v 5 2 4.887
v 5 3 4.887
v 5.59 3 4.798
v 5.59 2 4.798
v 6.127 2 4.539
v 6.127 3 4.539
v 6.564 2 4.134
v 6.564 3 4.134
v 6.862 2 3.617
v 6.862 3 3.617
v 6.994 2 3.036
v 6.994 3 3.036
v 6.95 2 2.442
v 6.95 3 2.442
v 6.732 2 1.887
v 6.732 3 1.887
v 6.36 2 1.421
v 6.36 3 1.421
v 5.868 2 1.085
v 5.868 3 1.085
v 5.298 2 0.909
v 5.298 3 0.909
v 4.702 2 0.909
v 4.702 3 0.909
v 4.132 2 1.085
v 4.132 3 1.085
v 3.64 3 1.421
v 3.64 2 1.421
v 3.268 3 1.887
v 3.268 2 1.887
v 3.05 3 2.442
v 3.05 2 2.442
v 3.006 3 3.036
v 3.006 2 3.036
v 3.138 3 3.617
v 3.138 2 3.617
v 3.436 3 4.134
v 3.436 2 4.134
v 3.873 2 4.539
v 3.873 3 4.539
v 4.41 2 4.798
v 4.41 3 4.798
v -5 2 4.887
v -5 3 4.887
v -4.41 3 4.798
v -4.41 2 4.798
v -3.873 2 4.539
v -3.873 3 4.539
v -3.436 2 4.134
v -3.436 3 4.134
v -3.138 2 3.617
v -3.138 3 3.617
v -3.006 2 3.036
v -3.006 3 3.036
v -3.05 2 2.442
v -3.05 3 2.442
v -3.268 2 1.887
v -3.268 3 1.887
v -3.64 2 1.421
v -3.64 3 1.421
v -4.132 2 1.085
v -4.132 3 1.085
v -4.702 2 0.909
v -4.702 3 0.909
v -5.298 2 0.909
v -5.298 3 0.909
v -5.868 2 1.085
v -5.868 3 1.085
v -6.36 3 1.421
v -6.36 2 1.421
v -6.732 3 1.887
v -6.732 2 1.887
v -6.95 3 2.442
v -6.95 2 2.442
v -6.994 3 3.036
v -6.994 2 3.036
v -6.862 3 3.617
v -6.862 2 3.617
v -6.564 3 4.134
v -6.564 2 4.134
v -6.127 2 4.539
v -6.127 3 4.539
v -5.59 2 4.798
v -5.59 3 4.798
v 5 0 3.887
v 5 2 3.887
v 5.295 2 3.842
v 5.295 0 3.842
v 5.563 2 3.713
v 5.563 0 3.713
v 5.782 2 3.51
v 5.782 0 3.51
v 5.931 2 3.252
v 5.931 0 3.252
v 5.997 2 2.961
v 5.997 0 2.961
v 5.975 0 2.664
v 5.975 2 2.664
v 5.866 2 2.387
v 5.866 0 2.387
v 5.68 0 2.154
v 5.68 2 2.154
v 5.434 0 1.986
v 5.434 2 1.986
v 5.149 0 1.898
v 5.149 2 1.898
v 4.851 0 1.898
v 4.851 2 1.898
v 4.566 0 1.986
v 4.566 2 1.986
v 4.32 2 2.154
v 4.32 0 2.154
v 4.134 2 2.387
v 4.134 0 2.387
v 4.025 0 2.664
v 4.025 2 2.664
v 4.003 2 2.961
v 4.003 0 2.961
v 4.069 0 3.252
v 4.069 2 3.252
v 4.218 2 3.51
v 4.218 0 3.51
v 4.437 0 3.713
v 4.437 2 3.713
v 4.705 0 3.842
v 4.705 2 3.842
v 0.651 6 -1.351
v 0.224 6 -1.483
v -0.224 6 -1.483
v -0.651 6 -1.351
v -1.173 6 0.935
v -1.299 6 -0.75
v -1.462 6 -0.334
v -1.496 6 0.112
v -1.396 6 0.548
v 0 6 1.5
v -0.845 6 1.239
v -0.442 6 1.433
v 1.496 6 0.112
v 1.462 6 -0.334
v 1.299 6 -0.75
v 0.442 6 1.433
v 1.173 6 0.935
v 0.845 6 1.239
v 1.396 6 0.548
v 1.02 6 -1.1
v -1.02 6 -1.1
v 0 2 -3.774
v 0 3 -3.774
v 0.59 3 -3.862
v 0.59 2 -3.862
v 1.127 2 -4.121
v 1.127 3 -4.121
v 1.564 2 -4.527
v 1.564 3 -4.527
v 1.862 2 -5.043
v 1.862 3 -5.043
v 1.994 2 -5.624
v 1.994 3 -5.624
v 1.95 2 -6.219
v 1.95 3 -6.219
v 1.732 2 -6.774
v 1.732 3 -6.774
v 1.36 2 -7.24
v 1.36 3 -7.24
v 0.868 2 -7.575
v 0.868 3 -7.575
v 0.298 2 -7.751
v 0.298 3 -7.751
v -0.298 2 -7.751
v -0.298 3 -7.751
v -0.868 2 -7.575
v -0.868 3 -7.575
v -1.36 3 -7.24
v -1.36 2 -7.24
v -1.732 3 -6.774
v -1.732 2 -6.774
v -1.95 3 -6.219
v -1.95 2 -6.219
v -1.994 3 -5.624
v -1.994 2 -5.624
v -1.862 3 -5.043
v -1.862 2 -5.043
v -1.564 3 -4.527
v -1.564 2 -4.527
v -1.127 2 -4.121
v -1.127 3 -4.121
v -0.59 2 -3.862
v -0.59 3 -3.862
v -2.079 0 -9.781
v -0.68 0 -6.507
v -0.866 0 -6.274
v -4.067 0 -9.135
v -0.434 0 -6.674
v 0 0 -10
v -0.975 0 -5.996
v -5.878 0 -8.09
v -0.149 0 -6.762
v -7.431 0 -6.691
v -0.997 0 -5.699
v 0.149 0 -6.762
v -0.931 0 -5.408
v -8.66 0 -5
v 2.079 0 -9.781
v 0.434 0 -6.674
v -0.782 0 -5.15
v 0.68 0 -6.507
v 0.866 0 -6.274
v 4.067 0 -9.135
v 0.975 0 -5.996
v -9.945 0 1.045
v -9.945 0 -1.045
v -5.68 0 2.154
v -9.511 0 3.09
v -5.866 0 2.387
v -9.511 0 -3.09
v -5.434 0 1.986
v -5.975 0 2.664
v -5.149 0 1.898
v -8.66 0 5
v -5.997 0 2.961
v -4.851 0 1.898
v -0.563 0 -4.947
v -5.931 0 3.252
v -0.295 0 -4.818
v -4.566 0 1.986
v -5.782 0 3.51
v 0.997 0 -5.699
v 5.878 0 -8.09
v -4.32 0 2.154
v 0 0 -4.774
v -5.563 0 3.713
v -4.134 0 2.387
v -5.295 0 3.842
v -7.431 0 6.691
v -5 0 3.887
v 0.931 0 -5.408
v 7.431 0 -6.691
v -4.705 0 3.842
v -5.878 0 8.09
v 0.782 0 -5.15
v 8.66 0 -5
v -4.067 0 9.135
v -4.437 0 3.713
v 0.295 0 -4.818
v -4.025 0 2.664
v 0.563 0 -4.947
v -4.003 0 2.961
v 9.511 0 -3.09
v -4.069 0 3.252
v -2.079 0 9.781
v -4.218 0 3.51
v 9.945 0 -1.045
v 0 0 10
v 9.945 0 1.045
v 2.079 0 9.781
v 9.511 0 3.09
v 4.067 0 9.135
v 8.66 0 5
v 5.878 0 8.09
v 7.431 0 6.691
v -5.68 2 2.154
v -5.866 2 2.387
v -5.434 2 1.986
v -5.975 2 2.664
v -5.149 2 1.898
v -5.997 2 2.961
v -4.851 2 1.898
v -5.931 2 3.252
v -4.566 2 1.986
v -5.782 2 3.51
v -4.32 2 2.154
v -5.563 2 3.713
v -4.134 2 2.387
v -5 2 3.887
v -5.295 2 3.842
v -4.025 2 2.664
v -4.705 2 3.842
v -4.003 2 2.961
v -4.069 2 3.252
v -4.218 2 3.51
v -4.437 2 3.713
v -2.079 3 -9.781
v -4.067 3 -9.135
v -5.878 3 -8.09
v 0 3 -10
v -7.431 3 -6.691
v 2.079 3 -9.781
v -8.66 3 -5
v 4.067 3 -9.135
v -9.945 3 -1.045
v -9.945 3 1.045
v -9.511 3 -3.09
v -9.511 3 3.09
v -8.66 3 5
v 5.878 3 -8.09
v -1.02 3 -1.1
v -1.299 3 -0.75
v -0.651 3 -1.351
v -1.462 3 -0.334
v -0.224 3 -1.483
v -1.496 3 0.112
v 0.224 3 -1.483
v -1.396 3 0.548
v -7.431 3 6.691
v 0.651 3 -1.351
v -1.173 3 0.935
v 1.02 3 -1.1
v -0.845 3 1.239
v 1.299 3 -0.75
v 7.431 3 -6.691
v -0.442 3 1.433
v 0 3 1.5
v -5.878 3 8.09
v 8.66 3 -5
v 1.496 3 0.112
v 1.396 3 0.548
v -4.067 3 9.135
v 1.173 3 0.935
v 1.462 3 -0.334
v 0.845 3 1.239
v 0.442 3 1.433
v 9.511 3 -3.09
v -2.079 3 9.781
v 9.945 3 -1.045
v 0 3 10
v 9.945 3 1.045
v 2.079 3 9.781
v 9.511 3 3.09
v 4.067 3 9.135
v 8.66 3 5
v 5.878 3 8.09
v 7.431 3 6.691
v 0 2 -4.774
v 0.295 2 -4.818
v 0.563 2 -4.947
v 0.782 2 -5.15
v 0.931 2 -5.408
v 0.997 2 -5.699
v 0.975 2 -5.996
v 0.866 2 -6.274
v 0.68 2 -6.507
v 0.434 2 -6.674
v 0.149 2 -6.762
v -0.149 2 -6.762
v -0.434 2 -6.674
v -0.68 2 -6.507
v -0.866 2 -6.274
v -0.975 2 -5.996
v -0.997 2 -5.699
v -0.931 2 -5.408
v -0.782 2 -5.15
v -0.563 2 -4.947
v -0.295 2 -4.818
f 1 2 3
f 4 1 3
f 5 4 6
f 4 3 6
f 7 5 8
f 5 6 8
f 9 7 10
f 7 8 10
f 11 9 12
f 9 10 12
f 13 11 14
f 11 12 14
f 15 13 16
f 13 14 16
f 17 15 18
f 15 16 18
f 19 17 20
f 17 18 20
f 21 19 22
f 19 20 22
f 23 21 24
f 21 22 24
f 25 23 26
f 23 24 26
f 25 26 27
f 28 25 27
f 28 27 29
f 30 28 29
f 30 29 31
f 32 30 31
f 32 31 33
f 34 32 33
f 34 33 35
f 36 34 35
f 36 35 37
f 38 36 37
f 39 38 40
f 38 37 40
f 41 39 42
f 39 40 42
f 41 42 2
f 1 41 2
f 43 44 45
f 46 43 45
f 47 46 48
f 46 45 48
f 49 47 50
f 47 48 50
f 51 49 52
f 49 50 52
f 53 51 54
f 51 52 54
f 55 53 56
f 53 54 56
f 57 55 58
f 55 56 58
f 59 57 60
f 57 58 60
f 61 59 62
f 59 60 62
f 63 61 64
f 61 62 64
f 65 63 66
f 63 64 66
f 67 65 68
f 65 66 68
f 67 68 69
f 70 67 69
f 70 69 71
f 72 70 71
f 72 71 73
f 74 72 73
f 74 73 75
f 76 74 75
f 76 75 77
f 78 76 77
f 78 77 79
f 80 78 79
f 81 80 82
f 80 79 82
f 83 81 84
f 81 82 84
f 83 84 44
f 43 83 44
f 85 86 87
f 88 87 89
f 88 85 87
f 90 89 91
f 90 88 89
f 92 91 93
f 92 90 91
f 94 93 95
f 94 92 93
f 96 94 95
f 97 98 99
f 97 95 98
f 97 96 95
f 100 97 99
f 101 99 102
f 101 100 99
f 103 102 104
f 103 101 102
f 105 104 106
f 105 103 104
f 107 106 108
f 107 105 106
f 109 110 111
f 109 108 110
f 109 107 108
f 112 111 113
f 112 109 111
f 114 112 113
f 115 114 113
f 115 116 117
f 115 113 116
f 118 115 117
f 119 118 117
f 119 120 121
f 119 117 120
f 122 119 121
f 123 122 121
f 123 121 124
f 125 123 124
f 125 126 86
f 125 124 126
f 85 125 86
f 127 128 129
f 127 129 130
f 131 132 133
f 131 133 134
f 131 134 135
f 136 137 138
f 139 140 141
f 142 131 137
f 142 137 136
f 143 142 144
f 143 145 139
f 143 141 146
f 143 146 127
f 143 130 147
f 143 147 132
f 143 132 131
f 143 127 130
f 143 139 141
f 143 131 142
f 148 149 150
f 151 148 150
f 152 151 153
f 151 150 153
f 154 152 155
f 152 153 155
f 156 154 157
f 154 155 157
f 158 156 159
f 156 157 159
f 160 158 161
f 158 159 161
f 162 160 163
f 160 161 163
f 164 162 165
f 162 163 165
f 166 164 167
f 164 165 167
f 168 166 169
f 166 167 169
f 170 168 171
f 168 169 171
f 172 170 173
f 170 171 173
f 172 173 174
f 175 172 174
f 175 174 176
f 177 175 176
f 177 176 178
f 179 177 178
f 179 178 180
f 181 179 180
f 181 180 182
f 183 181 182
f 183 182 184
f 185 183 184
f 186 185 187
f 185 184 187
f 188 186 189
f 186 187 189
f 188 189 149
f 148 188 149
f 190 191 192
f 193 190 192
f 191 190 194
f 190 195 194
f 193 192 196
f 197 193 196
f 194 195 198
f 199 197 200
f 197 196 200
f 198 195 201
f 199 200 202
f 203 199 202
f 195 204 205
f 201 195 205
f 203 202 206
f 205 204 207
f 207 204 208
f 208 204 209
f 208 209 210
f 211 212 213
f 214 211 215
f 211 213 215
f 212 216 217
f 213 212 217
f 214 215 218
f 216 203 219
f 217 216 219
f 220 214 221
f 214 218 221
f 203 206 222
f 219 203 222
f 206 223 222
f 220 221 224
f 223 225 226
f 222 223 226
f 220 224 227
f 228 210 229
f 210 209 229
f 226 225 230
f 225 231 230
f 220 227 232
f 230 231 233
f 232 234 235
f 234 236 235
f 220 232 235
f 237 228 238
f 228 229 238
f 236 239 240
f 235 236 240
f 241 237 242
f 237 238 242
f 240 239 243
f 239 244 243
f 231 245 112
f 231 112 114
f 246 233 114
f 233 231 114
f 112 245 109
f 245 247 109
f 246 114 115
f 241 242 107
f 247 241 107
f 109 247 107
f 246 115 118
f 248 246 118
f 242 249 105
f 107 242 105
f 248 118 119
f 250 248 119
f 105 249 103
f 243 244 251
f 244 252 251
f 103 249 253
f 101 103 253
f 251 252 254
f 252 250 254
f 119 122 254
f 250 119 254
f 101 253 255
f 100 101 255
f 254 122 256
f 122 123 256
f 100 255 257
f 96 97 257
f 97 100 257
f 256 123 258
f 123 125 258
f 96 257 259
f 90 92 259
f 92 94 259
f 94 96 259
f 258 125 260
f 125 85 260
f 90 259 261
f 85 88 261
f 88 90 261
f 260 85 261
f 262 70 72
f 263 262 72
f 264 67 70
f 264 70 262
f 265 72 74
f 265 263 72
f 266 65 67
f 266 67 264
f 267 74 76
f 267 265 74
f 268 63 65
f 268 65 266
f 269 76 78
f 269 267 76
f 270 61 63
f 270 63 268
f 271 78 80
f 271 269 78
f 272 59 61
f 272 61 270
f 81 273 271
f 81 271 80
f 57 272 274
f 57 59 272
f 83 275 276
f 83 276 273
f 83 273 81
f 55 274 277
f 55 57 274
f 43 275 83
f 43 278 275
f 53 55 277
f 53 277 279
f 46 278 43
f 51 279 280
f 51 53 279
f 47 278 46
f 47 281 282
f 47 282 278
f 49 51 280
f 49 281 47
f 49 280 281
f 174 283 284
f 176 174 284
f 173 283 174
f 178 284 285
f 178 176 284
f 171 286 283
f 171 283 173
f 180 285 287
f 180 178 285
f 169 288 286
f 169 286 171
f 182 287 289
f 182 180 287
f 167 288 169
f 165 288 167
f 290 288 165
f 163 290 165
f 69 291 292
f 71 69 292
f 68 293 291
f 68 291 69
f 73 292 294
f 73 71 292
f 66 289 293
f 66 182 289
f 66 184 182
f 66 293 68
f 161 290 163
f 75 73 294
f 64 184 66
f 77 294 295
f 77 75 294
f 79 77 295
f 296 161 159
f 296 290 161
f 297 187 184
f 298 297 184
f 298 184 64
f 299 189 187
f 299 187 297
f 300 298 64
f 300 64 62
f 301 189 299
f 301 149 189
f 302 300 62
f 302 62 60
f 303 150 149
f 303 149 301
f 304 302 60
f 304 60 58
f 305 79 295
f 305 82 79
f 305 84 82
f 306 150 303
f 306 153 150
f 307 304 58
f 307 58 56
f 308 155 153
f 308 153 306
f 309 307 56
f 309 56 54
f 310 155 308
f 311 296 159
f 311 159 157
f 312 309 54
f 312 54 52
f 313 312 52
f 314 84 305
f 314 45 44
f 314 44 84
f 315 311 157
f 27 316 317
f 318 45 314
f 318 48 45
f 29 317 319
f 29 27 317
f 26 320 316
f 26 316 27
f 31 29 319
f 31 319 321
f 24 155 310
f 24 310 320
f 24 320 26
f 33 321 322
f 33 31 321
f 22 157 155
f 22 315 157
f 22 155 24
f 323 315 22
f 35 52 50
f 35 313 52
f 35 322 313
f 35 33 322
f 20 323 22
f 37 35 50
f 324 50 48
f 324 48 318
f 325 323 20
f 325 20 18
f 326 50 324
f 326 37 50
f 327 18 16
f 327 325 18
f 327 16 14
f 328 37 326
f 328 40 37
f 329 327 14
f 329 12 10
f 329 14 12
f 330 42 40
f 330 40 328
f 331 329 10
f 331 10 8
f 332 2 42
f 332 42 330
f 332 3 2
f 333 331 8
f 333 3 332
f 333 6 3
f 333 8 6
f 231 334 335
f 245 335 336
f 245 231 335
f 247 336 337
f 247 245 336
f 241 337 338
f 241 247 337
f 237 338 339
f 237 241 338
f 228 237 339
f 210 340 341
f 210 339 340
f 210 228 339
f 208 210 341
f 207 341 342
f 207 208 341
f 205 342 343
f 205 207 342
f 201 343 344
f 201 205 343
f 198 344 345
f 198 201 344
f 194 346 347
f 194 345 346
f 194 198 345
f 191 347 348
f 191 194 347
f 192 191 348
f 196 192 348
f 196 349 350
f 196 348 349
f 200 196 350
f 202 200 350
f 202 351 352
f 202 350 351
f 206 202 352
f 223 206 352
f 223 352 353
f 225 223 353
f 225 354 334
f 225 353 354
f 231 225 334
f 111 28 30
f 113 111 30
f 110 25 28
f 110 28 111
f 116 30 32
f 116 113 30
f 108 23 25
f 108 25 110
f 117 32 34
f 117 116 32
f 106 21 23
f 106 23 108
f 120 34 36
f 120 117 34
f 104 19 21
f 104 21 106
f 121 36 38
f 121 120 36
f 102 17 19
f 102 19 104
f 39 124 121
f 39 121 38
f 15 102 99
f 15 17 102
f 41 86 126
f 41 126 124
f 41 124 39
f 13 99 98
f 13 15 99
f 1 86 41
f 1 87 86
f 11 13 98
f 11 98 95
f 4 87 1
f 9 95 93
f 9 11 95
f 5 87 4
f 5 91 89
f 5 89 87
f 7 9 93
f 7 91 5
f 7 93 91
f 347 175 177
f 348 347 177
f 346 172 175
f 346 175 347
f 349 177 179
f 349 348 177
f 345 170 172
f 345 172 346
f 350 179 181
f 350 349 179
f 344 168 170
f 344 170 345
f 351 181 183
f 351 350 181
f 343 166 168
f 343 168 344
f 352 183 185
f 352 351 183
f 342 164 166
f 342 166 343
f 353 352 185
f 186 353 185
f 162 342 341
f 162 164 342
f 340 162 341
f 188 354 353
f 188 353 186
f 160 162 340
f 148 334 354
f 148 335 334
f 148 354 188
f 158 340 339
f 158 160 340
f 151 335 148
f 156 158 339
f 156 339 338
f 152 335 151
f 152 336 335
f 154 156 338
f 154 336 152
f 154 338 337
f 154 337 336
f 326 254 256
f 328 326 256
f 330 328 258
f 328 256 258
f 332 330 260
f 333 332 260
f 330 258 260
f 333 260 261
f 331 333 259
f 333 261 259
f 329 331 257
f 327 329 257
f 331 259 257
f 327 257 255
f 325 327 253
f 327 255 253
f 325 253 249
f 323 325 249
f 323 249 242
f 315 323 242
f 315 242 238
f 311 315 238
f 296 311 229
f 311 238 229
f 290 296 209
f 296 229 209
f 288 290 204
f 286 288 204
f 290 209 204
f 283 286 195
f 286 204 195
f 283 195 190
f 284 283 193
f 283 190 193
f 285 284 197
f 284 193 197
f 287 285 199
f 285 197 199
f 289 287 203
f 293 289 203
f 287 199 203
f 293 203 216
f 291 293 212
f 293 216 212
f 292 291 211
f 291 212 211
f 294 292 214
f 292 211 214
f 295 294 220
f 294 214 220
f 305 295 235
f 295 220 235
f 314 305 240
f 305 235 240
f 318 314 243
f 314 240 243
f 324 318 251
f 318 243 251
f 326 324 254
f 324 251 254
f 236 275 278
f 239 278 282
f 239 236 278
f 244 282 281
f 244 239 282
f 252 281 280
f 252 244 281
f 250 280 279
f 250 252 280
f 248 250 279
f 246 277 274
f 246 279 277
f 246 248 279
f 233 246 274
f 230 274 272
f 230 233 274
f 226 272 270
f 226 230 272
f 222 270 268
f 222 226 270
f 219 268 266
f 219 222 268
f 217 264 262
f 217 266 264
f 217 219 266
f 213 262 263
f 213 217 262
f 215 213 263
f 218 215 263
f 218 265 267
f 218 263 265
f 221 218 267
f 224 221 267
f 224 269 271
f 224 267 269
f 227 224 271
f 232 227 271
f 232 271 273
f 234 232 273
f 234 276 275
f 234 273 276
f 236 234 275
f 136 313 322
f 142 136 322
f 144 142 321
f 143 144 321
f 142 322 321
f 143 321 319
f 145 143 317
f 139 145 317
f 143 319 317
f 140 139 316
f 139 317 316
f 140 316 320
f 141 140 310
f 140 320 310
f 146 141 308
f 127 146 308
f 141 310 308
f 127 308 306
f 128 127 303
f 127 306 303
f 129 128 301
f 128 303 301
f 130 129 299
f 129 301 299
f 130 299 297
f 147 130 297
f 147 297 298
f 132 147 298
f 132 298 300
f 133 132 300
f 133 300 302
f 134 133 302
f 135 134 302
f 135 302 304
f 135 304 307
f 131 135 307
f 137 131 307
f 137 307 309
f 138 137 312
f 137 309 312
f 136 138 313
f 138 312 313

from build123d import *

# Parameters (mm, degrees)
SKETCH1_R           = 10
SKETCH1_R_2         = 1
BOSS_EXTRUDE1_DEPTH = 3
SKETCH2_R           = 2
CUT_EXTRUDE1_DEPTH  = 1
SKETCH4_R           = 1.5
BOSS_EXTRUDE2_DEPTH = 3


with BuildPart() as part:
    # Sketch1 → Boss-Extrude1 (new body)
    with BuildSketch(Plane(origin=(0, 0, 0), x_dir=(1, 0, 0), z_dir=(0, 1, 0))):
        with Locations(Location((0, 0, 0), (0, 0, 270))):
            Circle(SKETCH1_R)
        with Locations(Location((0, 5.773502692, 0), (0, 0, 270))):
            Circle(SKETCH1_R_2, mode=Mode.SUBTRACT)
        with Locations(Location((-5, -2.886751346, 0), (0, 0, 270))):
            Circle(SKETCH1_R_2, mode=Mode.SUBTRACT)
        with Locations(Location((5, -2.886751346, 0), (0, 0, 270))):
            Circle(SKETCH1_R_2, mode=Mode.SUBTRACT)
    extrude(amount=BOSS_EXTRUDE1_DEPTH)

    # Sketch2 → Cut-Extrude1 (cut)
    with BuildSketch(Plane(origin=(0, 3, 0), x_dir=(1, 0, 0), z_dir=(0, 1, 0))):
        with Locations(Location((0, 5.773502692, 0), (0, 0, 270))):
            Circle(SKETCH2_R)
        with Locations(Location((-5, -2.886751346, 0), (0, 0, 270))):
            Circle(SKETCH2_R)
        with Locations(Location((5, -2.886751346, 0), (0, 0, 270))):
            Circle(SKETCH2_R)
    extrude(amount=-CUT_EXTRUDE1_DEPTH, mode=Mode.SUBTRACT)

    # Sketch4 → Boss-Extrude2 (add)
    with BuildSketch(Plane(origin=(0, 3, 0), x_dir=(1, 0, 0), z_dir=(0, 1, 0))):
        with Locations(Location((0, 0, 0), (0, 0, 270))):
            Circle(SKETCH4_R)
    extrude(amount=BOSS_EXTRUDE2_DEPTH)


solid = part.part
